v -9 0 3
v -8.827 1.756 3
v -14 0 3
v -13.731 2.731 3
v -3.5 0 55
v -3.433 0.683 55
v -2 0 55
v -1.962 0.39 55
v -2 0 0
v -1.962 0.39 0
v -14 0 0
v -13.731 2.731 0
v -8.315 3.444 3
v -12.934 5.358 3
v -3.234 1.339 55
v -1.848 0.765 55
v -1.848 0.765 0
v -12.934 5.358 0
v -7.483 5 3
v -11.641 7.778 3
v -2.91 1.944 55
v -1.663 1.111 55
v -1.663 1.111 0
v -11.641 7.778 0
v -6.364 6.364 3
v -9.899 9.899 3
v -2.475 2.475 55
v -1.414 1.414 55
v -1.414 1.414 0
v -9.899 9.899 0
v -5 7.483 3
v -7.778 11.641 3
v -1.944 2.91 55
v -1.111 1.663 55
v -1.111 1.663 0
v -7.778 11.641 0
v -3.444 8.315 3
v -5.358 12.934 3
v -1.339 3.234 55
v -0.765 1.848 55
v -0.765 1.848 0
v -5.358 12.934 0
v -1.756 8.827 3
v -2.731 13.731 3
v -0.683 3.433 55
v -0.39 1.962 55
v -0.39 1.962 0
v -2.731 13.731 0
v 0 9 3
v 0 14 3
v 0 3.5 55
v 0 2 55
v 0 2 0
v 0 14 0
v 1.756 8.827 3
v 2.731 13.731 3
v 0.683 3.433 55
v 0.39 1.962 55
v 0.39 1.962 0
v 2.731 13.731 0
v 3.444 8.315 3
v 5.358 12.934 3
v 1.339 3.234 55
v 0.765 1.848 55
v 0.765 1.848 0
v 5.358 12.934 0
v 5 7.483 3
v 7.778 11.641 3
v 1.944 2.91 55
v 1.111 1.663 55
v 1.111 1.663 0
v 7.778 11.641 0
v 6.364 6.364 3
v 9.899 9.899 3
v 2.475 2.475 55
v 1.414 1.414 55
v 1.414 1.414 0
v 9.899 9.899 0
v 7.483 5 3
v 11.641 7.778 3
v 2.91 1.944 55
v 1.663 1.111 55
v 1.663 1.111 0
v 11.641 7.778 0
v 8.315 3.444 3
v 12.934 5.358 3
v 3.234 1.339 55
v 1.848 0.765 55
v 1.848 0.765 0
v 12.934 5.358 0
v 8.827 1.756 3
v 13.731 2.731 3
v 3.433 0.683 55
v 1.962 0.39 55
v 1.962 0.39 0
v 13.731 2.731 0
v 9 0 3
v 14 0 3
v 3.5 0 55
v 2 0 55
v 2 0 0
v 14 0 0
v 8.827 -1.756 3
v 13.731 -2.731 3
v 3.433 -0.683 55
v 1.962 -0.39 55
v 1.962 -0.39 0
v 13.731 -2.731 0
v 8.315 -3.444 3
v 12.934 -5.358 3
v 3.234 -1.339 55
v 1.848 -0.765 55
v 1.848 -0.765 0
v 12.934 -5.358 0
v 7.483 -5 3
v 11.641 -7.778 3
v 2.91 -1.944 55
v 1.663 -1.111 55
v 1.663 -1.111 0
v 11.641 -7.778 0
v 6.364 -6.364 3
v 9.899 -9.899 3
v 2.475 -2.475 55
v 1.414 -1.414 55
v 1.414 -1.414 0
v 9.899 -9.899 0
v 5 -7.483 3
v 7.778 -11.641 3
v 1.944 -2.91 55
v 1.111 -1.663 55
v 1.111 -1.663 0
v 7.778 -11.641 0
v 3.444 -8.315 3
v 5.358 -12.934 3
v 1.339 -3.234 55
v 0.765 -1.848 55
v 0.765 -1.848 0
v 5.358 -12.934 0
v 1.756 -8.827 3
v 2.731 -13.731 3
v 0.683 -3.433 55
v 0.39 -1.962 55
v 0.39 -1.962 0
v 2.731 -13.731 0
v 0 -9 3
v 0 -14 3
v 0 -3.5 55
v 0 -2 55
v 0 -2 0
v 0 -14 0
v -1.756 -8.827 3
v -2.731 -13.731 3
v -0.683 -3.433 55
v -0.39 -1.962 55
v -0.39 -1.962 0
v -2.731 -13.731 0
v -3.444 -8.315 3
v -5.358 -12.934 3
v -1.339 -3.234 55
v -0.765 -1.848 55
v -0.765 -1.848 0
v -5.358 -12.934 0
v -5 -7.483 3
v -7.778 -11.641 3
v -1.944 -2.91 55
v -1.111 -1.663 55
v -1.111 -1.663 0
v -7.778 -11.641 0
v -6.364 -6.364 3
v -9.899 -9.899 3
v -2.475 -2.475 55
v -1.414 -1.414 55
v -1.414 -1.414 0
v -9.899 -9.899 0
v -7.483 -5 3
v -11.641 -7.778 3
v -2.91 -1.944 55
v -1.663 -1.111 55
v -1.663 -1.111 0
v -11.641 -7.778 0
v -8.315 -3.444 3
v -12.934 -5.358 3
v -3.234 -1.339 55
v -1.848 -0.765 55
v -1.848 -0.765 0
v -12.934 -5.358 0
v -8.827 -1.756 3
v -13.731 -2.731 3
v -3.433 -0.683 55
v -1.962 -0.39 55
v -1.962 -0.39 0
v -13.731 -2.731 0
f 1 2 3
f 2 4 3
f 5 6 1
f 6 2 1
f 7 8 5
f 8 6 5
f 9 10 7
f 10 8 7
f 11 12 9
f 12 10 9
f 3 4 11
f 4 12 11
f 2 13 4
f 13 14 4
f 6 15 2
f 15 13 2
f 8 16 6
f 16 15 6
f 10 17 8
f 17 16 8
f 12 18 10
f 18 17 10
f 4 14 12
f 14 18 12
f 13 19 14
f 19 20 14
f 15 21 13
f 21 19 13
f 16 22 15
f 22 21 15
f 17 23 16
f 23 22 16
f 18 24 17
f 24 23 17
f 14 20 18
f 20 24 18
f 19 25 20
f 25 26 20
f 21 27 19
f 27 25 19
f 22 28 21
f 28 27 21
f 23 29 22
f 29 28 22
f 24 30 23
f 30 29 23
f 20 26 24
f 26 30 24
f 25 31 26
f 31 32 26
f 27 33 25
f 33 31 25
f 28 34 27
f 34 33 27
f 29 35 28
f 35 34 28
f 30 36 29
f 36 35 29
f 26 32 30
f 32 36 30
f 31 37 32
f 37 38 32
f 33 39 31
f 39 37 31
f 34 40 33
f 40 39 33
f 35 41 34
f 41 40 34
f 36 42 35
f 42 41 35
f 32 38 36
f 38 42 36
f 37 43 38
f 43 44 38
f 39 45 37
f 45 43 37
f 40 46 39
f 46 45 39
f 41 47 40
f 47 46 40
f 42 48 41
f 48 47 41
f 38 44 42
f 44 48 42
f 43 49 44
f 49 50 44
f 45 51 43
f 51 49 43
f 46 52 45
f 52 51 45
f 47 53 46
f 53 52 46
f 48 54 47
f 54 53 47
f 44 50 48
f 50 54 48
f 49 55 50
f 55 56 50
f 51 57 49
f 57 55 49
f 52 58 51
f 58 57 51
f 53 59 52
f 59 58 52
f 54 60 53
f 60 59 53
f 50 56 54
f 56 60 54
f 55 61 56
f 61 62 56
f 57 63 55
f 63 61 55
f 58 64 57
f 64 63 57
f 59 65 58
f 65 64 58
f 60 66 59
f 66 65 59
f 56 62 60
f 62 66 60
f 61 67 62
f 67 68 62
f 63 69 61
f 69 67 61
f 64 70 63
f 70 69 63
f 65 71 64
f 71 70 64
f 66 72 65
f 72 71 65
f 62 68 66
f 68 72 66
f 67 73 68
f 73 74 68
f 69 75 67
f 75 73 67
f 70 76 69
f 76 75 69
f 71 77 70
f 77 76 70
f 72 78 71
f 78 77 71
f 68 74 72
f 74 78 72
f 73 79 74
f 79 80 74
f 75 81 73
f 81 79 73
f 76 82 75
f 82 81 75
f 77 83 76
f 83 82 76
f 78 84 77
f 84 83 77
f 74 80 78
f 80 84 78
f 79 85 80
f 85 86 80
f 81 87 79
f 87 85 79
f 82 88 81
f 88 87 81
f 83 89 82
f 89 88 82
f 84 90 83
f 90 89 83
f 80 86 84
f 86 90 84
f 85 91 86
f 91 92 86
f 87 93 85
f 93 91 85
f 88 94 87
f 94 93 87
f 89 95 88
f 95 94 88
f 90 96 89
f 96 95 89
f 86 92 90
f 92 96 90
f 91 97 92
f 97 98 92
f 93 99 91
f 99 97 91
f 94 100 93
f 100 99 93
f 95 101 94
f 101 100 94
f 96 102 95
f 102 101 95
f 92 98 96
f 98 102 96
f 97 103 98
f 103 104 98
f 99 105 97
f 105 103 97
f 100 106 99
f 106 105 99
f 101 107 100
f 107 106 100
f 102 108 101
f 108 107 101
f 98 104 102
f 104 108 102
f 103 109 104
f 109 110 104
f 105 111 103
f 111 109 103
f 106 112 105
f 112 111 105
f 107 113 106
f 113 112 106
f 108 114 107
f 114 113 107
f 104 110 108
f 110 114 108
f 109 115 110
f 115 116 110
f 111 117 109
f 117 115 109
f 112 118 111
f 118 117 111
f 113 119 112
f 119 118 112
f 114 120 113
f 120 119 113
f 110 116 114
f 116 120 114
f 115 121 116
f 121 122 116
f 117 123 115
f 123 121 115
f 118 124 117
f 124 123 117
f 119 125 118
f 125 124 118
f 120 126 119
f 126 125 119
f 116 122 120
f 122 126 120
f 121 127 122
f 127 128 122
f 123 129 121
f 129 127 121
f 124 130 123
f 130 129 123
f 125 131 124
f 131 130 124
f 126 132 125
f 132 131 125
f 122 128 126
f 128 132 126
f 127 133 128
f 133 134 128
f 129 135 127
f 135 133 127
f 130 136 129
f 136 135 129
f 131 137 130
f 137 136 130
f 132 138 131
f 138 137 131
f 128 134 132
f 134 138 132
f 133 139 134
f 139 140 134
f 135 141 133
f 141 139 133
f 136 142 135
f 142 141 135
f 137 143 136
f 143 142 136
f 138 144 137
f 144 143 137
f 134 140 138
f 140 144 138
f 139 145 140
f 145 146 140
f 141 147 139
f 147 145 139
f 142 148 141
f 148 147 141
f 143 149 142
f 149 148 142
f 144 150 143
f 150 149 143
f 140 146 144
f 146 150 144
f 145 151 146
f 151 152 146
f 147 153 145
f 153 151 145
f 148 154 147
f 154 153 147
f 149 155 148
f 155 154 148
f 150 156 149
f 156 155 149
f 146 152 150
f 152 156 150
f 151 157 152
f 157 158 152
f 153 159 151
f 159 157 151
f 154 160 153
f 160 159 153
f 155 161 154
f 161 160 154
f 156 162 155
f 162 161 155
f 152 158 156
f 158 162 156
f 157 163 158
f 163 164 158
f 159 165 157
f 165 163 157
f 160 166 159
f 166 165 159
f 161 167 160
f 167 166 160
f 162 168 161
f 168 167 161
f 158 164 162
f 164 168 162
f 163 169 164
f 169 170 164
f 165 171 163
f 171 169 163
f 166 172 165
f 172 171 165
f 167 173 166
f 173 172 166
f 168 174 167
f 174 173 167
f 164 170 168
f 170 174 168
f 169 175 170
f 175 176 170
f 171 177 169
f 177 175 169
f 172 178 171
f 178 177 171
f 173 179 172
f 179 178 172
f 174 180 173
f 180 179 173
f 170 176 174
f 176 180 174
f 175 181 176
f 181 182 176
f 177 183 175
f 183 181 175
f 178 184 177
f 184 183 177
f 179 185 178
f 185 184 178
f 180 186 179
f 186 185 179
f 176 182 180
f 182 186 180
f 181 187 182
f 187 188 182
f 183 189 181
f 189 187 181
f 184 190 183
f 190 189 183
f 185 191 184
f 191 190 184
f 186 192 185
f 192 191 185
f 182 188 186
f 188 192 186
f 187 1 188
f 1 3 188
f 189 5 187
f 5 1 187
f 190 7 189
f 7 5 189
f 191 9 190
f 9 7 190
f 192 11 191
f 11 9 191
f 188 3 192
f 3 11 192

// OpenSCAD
$fn = 32;

// ----------------------------------------------------------------------
// Profiled standoff: conical spacer, 55 mm long, bore 4 mm
// ----------------------------------------------------------------------

// --- parameters (mm) ---
revolve_angle = 360;      // full turn around the Z axis
profile_points = 6;       // points of the closed outline

profile = [[2, 0], [14, 0], [14, 3], [9, 3], [3.5, 55], [2, 55]];  // single closed polygon, 6 points, counter clockwise

// --- the one profile operation ---
rotate_extrude(angle = revolve_angle) polygon(points = profile);
